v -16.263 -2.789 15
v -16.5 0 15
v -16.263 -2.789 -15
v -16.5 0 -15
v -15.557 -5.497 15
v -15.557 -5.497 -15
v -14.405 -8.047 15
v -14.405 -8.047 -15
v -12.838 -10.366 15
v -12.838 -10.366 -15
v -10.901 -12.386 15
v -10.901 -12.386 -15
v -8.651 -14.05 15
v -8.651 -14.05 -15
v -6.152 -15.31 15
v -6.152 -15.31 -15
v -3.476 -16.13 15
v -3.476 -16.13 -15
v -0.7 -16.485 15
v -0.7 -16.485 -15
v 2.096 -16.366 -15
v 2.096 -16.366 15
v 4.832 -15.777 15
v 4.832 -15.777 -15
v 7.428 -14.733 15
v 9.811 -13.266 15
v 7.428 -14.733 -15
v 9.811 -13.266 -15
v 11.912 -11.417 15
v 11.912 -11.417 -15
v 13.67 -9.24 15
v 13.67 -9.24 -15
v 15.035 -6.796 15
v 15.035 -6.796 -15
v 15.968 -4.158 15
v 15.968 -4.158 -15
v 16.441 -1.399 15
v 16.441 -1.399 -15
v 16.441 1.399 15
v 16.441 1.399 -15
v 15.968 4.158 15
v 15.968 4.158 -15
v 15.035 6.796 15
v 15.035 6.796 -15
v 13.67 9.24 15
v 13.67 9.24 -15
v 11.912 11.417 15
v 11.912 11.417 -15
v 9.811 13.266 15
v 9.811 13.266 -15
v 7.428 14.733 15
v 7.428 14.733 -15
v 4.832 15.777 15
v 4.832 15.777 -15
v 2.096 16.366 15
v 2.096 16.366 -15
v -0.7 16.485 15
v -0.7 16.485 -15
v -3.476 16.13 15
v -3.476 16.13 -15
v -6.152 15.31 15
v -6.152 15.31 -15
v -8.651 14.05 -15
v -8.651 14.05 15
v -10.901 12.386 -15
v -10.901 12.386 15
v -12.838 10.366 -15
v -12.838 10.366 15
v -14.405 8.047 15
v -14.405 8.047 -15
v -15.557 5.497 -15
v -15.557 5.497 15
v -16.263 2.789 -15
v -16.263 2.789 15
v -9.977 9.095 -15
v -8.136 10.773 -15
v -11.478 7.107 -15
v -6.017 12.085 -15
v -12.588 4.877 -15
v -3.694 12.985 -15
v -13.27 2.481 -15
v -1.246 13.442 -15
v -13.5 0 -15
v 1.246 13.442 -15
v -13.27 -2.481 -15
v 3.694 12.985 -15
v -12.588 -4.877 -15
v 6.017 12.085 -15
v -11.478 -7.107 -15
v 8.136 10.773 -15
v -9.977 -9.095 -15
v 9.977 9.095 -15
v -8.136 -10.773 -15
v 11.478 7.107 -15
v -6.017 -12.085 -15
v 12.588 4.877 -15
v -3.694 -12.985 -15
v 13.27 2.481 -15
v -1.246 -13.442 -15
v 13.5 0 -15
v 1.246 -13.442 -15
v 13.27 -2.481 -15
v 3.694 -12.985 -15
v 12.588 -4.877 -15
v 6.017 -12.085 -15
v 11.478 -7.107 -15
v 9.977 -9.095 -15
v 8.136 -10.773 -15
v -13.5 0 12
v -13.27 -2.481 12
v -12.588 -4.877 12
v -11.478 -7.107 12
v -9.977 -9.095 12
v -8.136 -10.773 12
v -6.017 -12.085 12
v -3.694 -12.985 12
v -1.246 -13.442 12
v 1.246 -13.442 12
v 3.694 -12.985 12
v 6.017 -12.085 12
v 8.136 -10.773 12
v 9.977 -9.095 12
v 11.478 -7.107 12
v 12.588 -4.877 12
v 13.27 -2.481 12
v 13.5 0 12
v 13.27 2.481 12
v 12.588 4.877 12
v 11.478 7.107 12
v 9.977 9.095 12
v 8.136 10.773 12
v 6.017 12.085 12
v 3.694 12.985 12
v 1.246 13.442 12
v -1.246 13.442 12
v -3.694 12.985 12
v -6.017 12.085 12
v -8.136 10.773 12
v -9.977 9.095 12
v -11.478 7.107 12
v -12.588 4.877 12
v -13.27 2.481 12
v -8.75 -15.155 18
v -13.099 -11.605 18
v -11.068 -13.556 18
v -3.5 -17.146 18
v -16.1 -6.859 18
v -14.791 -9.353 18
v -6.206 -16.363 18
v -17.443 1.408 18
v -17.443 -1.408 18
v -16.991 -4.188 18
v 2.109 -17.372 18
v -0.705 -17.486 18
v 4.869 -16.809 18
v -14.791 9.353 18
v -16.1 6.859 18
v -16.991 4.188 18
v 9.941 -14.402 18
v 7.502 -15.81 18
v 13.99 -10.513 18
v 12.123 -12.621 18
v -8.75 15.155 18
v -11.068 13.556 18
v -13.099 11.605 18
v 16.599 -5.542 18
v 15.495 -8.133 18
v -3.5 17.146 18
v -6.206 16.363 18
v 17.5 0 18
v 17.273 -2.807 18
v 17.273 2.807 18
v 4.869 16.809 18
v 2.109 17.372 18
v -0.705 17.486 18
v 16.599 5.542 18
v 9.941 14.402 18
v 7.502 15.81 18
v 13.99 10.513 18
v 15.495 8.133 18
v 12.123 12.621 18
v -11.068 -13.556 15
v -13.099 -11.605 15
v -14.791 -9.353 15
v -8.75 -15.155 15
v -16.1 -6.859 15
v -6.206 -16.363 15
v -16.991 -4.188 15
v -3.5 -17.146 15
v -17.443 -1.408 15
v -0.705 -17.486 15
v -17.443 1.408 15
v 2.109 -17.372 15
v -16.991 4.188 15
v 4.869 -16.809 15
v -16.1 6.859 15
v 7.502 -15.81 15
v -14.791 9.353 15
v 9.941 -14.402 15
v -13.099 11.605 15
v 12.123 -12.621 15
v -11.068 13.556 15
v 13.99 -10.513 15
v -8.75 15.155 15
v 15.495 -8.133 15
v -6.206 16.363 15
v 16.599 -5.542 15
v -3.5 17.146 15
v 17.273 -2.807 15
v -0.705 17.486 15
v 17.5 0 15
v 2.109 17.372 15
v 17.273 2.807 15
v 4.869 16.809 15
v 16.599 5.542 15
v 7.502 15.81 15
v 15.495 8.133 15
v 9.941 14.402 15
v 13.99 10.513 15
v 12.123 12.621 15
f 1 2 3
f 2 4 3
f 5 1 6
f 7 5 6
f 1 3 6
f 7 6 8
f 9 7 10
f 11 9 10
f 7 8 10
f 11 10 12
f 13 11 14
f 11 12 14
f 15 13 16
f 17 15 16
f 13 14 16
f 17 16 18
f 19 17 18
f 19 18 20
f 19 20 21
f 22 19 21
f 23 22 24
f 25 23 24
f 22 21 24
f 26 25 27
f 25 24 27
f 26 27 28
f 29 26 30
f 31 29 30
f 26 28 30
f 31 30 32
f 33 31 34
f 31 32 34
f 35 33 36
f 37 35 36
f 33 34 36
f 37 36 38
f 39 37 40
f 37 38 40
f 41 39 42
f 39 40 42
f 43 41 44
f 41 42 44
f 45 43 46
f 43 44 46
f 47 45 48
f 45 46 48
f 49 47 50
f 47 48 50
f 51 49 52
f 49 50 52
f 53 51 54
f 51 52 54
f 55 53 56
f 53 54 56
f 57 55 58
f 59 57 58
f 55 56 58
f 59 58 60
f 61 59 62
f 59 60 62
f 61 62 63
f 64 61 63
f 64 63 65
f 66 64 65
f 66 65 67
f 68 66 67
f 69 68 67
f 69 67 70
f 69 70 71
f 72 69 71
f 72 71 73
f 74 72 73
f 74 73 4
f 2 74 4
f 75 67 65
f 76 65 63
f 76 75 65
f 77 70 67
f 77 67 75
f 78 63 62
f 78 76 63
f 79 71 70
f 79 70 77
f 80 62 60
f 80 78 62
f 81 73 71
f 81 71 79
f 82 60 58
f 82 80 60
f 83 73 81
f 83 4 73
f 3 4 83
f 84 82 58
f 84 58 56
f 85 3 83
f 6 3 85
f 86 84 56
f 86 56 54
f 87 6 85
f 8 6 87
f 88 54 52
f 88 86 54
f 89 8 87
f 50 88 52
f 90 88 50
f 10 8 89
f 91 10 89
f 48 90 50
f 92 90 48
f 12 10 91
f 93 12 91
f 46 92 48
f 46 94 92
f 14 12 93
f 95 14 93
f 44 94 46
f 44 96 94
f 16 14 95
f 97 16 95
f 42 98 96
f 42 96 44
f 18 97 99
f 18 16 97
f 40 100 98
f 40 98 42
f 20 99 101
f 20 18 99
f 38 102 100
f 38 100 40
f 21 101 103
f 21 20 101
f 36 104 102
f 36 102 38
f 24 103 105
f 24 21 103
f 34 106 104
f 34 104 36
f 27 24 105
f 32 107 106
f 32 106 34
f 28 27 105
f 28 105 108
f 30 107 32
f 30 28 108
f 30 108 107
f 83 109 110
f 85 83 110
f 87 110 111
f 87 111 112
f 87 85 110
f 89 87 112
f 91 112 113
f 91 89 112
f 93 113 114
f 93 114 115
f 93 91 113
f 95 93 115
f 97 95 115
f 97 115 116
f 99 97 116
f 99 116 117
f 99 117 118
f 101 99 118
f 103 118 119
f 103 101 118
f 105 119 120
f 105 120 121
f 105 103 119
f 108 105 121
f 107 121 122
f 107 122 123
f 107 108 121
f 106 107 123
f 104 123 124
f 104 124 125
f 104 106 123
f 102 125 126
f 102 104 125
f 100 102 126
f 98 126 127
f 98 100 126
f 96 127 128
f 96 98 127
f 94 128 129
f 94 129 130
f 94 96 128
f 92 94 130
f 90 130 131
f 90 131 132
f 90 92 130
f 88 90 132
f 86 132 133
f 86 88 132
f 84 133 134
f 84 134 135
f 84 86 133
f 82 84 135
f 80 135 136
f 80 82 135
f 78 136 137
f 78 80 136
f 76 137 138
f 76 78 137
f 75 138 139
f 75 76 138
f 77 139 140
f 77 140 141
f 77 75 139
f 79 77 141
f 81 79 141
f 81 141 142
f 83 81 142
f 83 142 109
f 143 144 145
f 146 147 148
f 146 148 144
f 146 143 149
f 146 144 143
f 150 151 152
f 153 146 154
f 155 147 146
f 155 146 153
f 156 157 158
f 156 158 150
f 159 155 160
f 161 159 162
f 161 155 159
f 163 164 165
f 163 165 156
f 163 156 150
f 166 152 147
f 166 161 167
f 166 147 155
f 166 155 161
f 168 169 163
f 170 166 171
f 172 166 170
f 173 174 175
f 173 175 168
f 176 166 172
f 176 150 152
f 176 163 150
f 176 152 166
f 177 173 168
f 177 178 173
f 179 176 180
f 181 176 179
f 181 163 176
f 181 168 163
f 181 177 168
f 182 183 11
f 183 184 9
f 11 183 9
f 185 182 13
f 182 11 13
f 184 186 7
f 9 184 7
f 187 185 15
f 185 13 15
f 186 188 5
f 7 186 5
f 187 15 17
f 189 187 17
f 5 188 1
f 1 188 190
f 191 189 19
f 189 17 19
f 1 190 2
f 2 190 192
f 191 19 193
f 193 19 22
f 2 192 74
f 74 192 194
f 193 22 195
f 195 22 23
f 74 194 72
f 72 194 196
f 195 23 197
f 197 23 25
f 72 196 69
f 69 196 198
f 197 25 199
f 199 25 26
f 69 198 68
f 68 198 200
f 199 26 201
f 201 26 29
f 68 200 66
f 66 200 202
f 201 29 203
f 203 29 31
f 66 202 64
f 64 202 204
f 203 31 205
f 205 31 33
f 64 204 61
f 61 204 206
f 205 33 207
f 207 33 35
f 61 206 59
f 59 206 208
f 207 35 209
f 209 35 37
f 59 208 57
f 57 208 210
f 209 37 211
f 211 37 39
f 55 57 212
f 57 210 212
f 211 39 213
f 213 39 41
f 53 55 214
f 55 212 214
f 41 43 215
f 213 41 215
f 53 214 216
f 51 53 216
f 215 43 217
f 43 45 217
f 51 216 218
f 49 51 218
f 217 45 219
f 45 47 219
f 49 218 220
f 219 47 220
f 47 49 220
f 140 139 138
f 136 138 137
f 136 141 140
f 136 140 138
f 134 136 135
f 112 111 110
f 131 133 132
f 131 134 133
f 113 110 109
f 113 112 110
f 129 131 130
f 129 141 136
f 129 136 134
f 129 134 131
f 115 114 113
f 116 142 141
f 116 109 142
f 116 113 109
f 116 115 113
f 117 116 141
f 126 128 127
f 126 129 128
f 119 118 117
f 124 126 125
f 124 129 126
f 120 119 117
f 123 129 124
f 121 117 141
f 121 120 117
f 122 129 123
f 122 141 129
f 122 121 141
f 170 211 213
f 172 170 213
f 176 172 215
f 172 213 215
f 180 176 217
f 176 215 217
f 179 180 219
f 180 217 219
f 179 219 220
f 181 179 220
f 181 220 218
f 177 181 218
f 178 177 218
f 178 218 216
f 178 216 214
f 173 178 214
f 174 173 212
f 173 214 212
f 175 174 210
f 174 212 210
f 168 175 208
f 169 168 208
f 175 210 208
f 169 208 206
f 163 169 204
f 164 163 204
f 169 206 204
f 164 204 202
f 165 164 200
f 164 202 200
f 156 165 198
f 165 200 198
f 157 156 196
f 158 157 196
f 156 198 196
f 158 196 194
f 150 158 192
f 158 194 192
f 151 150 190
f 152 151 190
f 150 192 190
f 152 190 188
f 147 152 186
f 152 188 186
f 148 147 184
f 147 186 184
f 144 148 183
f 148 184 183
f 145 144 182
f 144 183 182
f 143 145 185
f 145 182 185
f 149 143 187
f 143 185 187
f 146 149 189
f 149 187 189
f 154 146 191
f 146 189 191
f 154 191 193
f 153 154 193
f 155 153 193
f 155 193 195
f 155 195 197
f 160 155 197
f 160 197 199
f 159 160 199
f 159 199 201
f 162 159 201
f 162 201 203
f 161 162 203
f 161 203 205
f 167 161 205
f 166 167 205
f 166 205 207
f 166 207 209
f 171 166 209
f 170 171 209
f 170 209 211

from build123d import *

# Parameters (mm, degrees)
SKETCH1_W           = 3
SKETCH1_H           = 30
SKETCH1_W_2         = 13.5
SKETCH1_H_2         = 3
SKETCH2_R           = 17.5
BOSS_EXTRUDE1_DEPTH = 3


with BuildPart() as part:
    # Sketch1 → Revolve1 (revolve)
    with BuildSketch(Plane(origin=(0, 0, 0), x_dir=(1, 0, 0), z_dir=(0, 1, 0)), mode=Mode.PRIVATE) as revolve1_sk:
        with Locations((15, 0)):
            Rectangle(SKETCH1_W, SKETCH1_H)
        with Locations((6.75, -13.5)):
            Rectangle(SKETCH1_W_2, SKETCH1_H_2)
    revolve(revolve1_sk.sketch.rotate(Axis((0, 0, 0), (0, 0, 1)), 180), axis=Axis((0, 0, 0), (0, 0, 1)))

    # Sketch2 → Boss-Extrude1 (add)
    with BuildSketch(Plane.XY.offset(15)):
        Circle(SKETCH2_R)
    extrude(amount=BOSS_EXTRUDE1_DEPTH)


solid = part.part
